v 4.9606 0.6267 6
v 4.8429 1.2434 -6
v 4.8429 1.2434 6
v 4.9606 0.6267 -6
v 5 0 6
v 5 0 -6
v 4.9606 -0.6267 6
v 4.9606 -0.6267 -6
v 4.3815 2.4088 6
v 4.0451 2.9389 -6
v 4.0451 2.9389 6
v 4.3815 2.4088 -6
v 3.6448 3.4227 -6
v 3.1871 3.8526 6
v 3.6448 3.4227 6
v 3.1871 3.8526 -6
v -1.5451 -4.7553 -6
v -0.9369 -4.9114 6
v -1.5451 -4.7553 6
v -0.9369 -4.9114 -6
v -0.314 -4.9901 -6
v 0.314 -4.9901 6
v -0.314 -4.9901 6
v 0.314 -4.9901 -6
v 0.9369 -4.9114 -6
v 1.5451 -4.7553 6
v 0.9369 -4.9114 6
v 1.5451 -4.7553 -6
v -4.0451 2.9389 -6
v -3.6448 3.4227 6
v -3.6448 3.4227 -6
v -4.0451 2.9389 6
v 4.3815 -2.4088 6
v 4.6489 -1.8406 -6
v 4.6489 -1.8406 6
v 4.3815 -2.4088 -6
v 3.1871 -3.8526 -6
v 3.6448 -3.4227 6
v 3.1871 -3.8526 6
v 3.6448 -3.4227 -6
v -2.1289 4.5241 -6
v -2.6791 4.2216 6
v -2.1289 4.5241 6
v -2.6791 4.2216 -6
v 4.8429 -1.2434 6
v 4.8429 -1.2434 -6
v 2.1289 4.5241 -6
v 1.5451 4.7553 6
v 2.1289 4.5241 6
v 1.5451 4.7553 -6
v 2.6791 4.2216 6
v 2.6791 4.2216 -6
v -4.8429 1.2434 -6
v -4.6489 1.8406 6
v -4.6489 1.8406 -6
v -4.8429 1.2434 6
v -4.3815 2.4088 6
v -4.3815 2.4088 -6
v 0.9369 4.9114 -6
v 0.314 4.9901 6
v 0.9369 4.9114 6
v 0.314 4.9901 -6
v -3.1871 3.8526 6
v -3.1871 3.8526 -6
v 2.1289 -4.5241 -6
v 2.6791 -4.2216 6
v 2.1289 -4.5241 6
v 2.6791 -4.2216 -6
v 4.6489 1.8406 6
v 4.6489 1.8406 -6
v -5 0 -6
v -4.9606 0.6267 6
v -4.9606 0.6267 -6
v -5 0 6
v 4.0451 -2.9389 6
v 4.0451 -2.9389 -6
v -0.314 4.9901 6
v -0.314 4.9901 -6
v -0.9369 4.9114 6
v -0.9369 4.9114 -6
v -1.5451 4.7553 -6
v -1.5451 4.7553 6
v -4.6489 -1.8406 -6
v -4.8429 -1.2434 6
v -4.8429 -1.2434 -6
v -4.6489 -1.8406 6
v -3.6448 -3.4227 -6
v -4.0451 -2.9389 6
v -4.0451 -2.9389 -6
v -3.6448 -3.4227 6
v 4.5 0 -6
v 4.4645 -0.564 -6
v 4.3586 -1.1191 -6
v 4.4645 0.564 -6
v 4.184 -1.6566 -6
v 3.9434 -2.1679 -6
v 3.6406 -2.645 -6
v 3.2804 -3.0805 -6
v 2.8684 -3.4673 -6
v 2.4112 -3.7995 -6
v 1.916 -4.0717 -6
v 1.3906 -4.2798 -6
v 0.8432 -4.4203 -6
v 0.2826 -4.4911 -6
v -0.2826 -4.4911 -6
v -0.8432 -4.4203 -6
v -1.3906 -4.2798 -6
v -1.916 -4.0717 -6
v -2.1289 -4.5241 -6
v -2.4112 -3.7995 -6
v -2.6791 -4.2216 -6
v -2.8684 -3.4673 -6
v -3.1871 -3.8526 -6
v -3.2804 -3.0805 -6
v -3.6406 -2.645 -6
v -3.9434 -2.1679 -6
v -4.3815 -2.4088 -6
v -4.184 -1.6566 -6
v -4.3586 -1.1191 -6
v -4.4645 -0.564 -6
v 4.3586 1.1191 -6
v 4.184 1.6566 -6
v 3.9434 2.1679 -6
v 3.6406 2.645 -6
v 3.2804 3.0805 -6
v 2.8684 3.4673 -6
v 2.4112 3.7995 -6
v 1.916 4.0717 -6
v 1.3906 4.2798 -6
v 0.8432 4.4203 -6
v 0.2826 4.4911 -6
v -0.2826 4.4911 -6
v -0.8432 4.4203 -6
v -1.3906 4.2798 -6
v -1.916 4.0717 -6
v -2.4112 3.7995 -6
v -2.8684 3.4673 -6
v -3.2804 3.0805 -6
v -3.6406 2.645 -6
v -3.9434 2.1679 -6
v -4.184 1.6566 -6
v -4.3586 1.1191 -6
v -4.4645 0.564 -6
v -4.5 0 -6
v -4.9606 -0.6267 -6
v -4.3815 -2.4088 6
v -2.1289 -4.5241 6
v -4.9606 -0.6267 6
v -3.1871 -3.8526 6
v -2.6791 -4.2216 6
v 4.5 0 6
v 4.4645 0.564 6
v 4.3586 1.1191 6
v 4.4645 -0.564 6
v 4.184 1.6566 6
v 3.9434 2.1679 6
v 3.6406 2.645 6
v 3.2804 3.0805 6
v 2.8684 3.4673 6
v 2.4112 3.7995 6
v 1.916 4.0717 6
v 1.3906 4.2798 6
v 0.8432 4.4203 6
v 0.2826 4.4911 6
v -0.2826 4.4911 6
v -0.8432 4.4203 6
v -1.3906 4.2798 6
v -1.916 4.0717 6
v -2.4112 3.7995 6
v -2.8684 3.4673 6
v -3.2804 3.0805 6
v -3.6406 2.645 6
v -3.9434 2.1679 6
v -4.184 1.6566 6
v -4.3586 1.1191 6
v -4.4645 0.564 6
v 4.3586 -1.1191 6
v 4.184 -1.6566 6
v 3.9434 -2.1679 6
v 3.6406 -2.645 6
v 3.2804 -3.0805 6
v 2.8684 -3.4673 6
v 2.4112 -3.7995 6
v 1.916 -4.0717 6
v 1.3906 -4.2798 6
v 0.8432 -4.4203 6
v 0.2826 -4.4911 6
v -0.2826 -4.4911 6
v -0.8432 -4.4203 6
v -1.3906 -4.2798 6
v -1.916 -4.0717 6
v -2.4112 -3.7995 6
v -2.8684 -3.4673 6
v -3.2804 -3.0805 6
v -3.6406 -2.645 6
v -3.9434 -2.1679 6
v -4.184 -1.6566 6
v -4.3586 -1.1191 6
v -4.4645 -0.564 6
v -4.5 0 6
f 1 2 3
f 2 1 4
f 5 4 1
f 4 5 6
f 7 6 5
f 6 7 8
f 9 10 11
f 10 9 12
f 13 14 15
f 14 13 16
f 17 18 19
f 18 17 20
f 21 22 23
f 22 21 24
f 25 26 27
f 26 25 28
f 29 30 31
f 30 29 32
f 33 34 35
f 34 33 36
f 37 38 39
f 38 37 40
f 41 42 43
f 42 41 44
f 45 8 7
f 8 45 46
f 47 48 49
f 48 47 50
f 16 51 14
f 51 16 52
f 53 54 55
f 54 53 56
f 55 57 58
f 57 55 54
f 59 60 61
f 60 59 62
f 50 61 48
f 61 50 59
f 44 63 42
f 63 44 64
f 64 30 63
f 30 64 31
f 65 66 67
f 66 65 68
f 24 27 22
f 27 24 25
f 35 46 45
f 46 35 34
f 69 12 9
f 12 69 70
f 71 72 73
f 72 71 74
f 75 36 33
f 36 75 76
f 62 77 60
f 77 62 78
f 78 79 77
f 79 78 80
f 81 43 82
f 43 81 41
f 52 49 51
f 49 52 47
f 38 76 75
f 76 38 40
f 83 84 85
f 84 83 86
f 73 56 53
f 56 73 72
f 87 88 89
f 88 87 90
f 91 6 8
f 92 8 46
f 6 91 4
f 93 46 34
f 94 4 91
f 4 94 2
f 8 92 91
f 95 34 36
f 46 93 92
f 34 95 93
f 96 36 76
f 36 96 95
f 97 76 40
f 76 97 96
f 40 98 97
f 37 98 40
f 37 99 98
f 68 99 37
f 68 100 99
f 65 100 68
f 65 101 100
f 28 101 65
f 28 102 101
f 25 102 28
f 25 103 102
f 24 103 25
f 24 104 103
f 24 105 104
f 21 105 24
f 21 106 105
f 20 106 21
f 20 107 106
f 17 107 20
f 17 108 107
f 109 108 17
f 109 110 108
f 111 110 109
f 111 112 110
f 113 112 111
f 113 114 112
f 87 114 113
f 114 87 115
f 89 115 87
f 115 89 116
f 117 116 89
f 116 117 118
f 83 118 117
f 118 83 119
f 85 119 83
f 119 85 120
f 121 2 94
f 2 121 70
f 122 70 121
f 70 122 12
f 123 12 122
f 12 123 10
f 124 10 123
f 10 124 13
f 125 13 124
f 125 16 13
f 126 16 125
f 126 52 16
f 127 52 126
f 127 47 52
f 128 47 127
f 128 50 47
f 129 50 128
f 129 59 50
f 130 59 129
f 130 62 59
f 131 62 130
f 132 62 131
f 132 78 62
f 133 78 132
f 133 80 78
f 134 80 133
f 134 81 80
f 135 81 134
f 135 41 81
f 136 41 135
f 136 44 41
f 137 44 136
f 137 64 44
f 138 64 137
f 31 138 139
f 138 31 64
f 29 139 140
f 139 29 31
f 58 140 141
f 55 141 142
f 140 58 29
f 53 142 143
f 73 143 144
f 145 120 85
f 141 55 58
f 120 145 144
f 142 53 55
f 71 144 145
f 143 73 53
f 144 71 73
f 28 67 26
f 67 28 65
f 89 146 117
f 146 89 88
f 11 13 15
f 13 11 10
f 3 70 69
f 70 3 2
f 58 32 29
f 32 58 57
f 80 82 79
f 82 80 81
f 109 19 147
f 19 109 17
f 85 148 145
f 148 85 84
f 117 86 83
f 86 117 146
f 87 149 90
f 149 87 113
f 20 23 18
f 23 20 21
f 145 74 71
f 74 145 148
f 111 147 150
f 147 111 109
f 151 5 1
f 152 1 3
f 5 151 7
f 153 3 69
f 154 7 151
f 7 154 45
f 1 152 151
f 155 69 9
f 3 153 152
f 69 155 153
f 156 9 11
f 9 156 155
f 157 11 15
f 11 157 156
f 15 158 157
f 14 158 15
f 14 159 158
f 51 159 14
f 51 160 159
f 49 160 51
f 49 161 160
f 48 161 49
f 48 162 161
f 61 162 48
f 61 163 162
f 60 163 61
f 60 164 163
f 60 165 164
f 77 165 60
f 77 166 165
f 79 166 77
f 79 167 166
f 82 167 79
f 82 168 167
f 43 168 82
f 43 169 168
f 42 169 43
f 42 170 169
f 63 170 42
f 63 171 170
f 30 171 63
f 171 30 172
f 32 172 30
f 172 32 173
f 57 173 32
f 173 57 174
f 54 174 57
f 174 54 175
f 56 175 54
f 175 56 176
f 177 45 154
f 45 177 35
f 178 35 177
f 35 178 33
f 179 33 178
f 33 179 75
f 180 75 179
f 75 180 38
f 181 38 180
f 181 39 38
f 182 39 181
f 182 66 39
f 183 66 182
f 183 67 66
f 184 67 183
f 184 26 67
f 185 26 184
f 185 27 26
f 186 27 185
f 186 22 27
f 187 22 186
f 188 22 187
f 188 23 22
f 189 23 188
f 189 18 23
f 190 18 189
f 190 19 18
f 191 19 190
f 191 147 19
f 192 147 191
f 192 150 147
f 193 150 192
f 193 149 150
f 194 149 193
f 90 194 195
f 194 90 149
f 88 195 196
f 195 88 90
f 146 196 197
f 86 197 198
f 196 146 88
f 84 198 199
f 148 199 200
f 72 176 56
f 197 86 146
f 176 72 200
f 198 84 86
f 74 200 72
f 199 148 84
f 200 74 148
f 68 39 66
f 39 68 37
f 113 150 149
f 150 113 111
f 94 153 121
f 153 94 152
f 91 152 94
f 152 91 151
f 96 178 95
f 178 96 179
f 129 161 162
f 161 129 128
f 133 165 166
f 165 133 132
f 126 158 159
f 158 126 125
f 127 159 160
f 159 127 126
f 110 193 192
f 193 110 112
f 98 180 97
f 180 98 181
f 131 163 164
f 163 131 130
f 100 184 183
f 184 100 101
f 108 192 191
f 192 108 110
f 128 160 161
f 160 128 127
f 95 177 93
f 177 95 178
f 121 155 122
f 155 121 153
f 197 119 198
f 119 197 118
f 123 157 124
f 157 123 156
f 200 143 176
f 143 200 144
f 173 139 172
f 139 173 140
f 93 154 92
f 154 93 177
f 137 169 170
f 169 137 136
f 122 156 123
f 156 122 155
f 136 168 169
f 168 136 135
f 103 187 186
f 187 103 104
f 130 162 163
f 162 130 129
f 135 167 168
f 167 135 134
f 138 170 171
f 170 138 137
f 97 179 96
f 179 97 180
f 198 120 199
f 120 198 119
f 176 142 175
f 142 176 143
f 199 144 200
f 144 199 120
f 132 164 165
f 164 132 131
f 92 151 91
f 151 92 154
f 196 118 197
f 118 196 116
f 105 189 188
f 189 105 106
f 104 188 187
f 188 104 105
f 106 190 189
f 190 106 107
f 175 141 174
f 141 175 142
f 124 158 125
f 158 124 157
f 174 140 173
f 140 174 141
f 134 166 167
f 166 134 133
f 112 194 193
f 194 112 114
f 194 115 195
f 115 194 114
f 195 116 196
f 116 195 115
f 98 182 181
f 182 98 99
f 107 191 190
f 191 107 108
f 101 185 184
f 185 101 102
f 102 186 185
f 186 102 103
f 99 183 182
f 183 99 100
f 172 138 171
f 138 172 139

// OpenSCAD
$fn = 50;


difference() {
	union() {
		translate(v = [0, 0, -6.0000000000]) {
			cylinder(h = 12, r = 5.0000000000);
		}
	}
	union() {
		translate(v = [0, 0, -100.0000000000]) {
			cylinder(h = 200, r = 4.5000000000);
		}
	}
}
